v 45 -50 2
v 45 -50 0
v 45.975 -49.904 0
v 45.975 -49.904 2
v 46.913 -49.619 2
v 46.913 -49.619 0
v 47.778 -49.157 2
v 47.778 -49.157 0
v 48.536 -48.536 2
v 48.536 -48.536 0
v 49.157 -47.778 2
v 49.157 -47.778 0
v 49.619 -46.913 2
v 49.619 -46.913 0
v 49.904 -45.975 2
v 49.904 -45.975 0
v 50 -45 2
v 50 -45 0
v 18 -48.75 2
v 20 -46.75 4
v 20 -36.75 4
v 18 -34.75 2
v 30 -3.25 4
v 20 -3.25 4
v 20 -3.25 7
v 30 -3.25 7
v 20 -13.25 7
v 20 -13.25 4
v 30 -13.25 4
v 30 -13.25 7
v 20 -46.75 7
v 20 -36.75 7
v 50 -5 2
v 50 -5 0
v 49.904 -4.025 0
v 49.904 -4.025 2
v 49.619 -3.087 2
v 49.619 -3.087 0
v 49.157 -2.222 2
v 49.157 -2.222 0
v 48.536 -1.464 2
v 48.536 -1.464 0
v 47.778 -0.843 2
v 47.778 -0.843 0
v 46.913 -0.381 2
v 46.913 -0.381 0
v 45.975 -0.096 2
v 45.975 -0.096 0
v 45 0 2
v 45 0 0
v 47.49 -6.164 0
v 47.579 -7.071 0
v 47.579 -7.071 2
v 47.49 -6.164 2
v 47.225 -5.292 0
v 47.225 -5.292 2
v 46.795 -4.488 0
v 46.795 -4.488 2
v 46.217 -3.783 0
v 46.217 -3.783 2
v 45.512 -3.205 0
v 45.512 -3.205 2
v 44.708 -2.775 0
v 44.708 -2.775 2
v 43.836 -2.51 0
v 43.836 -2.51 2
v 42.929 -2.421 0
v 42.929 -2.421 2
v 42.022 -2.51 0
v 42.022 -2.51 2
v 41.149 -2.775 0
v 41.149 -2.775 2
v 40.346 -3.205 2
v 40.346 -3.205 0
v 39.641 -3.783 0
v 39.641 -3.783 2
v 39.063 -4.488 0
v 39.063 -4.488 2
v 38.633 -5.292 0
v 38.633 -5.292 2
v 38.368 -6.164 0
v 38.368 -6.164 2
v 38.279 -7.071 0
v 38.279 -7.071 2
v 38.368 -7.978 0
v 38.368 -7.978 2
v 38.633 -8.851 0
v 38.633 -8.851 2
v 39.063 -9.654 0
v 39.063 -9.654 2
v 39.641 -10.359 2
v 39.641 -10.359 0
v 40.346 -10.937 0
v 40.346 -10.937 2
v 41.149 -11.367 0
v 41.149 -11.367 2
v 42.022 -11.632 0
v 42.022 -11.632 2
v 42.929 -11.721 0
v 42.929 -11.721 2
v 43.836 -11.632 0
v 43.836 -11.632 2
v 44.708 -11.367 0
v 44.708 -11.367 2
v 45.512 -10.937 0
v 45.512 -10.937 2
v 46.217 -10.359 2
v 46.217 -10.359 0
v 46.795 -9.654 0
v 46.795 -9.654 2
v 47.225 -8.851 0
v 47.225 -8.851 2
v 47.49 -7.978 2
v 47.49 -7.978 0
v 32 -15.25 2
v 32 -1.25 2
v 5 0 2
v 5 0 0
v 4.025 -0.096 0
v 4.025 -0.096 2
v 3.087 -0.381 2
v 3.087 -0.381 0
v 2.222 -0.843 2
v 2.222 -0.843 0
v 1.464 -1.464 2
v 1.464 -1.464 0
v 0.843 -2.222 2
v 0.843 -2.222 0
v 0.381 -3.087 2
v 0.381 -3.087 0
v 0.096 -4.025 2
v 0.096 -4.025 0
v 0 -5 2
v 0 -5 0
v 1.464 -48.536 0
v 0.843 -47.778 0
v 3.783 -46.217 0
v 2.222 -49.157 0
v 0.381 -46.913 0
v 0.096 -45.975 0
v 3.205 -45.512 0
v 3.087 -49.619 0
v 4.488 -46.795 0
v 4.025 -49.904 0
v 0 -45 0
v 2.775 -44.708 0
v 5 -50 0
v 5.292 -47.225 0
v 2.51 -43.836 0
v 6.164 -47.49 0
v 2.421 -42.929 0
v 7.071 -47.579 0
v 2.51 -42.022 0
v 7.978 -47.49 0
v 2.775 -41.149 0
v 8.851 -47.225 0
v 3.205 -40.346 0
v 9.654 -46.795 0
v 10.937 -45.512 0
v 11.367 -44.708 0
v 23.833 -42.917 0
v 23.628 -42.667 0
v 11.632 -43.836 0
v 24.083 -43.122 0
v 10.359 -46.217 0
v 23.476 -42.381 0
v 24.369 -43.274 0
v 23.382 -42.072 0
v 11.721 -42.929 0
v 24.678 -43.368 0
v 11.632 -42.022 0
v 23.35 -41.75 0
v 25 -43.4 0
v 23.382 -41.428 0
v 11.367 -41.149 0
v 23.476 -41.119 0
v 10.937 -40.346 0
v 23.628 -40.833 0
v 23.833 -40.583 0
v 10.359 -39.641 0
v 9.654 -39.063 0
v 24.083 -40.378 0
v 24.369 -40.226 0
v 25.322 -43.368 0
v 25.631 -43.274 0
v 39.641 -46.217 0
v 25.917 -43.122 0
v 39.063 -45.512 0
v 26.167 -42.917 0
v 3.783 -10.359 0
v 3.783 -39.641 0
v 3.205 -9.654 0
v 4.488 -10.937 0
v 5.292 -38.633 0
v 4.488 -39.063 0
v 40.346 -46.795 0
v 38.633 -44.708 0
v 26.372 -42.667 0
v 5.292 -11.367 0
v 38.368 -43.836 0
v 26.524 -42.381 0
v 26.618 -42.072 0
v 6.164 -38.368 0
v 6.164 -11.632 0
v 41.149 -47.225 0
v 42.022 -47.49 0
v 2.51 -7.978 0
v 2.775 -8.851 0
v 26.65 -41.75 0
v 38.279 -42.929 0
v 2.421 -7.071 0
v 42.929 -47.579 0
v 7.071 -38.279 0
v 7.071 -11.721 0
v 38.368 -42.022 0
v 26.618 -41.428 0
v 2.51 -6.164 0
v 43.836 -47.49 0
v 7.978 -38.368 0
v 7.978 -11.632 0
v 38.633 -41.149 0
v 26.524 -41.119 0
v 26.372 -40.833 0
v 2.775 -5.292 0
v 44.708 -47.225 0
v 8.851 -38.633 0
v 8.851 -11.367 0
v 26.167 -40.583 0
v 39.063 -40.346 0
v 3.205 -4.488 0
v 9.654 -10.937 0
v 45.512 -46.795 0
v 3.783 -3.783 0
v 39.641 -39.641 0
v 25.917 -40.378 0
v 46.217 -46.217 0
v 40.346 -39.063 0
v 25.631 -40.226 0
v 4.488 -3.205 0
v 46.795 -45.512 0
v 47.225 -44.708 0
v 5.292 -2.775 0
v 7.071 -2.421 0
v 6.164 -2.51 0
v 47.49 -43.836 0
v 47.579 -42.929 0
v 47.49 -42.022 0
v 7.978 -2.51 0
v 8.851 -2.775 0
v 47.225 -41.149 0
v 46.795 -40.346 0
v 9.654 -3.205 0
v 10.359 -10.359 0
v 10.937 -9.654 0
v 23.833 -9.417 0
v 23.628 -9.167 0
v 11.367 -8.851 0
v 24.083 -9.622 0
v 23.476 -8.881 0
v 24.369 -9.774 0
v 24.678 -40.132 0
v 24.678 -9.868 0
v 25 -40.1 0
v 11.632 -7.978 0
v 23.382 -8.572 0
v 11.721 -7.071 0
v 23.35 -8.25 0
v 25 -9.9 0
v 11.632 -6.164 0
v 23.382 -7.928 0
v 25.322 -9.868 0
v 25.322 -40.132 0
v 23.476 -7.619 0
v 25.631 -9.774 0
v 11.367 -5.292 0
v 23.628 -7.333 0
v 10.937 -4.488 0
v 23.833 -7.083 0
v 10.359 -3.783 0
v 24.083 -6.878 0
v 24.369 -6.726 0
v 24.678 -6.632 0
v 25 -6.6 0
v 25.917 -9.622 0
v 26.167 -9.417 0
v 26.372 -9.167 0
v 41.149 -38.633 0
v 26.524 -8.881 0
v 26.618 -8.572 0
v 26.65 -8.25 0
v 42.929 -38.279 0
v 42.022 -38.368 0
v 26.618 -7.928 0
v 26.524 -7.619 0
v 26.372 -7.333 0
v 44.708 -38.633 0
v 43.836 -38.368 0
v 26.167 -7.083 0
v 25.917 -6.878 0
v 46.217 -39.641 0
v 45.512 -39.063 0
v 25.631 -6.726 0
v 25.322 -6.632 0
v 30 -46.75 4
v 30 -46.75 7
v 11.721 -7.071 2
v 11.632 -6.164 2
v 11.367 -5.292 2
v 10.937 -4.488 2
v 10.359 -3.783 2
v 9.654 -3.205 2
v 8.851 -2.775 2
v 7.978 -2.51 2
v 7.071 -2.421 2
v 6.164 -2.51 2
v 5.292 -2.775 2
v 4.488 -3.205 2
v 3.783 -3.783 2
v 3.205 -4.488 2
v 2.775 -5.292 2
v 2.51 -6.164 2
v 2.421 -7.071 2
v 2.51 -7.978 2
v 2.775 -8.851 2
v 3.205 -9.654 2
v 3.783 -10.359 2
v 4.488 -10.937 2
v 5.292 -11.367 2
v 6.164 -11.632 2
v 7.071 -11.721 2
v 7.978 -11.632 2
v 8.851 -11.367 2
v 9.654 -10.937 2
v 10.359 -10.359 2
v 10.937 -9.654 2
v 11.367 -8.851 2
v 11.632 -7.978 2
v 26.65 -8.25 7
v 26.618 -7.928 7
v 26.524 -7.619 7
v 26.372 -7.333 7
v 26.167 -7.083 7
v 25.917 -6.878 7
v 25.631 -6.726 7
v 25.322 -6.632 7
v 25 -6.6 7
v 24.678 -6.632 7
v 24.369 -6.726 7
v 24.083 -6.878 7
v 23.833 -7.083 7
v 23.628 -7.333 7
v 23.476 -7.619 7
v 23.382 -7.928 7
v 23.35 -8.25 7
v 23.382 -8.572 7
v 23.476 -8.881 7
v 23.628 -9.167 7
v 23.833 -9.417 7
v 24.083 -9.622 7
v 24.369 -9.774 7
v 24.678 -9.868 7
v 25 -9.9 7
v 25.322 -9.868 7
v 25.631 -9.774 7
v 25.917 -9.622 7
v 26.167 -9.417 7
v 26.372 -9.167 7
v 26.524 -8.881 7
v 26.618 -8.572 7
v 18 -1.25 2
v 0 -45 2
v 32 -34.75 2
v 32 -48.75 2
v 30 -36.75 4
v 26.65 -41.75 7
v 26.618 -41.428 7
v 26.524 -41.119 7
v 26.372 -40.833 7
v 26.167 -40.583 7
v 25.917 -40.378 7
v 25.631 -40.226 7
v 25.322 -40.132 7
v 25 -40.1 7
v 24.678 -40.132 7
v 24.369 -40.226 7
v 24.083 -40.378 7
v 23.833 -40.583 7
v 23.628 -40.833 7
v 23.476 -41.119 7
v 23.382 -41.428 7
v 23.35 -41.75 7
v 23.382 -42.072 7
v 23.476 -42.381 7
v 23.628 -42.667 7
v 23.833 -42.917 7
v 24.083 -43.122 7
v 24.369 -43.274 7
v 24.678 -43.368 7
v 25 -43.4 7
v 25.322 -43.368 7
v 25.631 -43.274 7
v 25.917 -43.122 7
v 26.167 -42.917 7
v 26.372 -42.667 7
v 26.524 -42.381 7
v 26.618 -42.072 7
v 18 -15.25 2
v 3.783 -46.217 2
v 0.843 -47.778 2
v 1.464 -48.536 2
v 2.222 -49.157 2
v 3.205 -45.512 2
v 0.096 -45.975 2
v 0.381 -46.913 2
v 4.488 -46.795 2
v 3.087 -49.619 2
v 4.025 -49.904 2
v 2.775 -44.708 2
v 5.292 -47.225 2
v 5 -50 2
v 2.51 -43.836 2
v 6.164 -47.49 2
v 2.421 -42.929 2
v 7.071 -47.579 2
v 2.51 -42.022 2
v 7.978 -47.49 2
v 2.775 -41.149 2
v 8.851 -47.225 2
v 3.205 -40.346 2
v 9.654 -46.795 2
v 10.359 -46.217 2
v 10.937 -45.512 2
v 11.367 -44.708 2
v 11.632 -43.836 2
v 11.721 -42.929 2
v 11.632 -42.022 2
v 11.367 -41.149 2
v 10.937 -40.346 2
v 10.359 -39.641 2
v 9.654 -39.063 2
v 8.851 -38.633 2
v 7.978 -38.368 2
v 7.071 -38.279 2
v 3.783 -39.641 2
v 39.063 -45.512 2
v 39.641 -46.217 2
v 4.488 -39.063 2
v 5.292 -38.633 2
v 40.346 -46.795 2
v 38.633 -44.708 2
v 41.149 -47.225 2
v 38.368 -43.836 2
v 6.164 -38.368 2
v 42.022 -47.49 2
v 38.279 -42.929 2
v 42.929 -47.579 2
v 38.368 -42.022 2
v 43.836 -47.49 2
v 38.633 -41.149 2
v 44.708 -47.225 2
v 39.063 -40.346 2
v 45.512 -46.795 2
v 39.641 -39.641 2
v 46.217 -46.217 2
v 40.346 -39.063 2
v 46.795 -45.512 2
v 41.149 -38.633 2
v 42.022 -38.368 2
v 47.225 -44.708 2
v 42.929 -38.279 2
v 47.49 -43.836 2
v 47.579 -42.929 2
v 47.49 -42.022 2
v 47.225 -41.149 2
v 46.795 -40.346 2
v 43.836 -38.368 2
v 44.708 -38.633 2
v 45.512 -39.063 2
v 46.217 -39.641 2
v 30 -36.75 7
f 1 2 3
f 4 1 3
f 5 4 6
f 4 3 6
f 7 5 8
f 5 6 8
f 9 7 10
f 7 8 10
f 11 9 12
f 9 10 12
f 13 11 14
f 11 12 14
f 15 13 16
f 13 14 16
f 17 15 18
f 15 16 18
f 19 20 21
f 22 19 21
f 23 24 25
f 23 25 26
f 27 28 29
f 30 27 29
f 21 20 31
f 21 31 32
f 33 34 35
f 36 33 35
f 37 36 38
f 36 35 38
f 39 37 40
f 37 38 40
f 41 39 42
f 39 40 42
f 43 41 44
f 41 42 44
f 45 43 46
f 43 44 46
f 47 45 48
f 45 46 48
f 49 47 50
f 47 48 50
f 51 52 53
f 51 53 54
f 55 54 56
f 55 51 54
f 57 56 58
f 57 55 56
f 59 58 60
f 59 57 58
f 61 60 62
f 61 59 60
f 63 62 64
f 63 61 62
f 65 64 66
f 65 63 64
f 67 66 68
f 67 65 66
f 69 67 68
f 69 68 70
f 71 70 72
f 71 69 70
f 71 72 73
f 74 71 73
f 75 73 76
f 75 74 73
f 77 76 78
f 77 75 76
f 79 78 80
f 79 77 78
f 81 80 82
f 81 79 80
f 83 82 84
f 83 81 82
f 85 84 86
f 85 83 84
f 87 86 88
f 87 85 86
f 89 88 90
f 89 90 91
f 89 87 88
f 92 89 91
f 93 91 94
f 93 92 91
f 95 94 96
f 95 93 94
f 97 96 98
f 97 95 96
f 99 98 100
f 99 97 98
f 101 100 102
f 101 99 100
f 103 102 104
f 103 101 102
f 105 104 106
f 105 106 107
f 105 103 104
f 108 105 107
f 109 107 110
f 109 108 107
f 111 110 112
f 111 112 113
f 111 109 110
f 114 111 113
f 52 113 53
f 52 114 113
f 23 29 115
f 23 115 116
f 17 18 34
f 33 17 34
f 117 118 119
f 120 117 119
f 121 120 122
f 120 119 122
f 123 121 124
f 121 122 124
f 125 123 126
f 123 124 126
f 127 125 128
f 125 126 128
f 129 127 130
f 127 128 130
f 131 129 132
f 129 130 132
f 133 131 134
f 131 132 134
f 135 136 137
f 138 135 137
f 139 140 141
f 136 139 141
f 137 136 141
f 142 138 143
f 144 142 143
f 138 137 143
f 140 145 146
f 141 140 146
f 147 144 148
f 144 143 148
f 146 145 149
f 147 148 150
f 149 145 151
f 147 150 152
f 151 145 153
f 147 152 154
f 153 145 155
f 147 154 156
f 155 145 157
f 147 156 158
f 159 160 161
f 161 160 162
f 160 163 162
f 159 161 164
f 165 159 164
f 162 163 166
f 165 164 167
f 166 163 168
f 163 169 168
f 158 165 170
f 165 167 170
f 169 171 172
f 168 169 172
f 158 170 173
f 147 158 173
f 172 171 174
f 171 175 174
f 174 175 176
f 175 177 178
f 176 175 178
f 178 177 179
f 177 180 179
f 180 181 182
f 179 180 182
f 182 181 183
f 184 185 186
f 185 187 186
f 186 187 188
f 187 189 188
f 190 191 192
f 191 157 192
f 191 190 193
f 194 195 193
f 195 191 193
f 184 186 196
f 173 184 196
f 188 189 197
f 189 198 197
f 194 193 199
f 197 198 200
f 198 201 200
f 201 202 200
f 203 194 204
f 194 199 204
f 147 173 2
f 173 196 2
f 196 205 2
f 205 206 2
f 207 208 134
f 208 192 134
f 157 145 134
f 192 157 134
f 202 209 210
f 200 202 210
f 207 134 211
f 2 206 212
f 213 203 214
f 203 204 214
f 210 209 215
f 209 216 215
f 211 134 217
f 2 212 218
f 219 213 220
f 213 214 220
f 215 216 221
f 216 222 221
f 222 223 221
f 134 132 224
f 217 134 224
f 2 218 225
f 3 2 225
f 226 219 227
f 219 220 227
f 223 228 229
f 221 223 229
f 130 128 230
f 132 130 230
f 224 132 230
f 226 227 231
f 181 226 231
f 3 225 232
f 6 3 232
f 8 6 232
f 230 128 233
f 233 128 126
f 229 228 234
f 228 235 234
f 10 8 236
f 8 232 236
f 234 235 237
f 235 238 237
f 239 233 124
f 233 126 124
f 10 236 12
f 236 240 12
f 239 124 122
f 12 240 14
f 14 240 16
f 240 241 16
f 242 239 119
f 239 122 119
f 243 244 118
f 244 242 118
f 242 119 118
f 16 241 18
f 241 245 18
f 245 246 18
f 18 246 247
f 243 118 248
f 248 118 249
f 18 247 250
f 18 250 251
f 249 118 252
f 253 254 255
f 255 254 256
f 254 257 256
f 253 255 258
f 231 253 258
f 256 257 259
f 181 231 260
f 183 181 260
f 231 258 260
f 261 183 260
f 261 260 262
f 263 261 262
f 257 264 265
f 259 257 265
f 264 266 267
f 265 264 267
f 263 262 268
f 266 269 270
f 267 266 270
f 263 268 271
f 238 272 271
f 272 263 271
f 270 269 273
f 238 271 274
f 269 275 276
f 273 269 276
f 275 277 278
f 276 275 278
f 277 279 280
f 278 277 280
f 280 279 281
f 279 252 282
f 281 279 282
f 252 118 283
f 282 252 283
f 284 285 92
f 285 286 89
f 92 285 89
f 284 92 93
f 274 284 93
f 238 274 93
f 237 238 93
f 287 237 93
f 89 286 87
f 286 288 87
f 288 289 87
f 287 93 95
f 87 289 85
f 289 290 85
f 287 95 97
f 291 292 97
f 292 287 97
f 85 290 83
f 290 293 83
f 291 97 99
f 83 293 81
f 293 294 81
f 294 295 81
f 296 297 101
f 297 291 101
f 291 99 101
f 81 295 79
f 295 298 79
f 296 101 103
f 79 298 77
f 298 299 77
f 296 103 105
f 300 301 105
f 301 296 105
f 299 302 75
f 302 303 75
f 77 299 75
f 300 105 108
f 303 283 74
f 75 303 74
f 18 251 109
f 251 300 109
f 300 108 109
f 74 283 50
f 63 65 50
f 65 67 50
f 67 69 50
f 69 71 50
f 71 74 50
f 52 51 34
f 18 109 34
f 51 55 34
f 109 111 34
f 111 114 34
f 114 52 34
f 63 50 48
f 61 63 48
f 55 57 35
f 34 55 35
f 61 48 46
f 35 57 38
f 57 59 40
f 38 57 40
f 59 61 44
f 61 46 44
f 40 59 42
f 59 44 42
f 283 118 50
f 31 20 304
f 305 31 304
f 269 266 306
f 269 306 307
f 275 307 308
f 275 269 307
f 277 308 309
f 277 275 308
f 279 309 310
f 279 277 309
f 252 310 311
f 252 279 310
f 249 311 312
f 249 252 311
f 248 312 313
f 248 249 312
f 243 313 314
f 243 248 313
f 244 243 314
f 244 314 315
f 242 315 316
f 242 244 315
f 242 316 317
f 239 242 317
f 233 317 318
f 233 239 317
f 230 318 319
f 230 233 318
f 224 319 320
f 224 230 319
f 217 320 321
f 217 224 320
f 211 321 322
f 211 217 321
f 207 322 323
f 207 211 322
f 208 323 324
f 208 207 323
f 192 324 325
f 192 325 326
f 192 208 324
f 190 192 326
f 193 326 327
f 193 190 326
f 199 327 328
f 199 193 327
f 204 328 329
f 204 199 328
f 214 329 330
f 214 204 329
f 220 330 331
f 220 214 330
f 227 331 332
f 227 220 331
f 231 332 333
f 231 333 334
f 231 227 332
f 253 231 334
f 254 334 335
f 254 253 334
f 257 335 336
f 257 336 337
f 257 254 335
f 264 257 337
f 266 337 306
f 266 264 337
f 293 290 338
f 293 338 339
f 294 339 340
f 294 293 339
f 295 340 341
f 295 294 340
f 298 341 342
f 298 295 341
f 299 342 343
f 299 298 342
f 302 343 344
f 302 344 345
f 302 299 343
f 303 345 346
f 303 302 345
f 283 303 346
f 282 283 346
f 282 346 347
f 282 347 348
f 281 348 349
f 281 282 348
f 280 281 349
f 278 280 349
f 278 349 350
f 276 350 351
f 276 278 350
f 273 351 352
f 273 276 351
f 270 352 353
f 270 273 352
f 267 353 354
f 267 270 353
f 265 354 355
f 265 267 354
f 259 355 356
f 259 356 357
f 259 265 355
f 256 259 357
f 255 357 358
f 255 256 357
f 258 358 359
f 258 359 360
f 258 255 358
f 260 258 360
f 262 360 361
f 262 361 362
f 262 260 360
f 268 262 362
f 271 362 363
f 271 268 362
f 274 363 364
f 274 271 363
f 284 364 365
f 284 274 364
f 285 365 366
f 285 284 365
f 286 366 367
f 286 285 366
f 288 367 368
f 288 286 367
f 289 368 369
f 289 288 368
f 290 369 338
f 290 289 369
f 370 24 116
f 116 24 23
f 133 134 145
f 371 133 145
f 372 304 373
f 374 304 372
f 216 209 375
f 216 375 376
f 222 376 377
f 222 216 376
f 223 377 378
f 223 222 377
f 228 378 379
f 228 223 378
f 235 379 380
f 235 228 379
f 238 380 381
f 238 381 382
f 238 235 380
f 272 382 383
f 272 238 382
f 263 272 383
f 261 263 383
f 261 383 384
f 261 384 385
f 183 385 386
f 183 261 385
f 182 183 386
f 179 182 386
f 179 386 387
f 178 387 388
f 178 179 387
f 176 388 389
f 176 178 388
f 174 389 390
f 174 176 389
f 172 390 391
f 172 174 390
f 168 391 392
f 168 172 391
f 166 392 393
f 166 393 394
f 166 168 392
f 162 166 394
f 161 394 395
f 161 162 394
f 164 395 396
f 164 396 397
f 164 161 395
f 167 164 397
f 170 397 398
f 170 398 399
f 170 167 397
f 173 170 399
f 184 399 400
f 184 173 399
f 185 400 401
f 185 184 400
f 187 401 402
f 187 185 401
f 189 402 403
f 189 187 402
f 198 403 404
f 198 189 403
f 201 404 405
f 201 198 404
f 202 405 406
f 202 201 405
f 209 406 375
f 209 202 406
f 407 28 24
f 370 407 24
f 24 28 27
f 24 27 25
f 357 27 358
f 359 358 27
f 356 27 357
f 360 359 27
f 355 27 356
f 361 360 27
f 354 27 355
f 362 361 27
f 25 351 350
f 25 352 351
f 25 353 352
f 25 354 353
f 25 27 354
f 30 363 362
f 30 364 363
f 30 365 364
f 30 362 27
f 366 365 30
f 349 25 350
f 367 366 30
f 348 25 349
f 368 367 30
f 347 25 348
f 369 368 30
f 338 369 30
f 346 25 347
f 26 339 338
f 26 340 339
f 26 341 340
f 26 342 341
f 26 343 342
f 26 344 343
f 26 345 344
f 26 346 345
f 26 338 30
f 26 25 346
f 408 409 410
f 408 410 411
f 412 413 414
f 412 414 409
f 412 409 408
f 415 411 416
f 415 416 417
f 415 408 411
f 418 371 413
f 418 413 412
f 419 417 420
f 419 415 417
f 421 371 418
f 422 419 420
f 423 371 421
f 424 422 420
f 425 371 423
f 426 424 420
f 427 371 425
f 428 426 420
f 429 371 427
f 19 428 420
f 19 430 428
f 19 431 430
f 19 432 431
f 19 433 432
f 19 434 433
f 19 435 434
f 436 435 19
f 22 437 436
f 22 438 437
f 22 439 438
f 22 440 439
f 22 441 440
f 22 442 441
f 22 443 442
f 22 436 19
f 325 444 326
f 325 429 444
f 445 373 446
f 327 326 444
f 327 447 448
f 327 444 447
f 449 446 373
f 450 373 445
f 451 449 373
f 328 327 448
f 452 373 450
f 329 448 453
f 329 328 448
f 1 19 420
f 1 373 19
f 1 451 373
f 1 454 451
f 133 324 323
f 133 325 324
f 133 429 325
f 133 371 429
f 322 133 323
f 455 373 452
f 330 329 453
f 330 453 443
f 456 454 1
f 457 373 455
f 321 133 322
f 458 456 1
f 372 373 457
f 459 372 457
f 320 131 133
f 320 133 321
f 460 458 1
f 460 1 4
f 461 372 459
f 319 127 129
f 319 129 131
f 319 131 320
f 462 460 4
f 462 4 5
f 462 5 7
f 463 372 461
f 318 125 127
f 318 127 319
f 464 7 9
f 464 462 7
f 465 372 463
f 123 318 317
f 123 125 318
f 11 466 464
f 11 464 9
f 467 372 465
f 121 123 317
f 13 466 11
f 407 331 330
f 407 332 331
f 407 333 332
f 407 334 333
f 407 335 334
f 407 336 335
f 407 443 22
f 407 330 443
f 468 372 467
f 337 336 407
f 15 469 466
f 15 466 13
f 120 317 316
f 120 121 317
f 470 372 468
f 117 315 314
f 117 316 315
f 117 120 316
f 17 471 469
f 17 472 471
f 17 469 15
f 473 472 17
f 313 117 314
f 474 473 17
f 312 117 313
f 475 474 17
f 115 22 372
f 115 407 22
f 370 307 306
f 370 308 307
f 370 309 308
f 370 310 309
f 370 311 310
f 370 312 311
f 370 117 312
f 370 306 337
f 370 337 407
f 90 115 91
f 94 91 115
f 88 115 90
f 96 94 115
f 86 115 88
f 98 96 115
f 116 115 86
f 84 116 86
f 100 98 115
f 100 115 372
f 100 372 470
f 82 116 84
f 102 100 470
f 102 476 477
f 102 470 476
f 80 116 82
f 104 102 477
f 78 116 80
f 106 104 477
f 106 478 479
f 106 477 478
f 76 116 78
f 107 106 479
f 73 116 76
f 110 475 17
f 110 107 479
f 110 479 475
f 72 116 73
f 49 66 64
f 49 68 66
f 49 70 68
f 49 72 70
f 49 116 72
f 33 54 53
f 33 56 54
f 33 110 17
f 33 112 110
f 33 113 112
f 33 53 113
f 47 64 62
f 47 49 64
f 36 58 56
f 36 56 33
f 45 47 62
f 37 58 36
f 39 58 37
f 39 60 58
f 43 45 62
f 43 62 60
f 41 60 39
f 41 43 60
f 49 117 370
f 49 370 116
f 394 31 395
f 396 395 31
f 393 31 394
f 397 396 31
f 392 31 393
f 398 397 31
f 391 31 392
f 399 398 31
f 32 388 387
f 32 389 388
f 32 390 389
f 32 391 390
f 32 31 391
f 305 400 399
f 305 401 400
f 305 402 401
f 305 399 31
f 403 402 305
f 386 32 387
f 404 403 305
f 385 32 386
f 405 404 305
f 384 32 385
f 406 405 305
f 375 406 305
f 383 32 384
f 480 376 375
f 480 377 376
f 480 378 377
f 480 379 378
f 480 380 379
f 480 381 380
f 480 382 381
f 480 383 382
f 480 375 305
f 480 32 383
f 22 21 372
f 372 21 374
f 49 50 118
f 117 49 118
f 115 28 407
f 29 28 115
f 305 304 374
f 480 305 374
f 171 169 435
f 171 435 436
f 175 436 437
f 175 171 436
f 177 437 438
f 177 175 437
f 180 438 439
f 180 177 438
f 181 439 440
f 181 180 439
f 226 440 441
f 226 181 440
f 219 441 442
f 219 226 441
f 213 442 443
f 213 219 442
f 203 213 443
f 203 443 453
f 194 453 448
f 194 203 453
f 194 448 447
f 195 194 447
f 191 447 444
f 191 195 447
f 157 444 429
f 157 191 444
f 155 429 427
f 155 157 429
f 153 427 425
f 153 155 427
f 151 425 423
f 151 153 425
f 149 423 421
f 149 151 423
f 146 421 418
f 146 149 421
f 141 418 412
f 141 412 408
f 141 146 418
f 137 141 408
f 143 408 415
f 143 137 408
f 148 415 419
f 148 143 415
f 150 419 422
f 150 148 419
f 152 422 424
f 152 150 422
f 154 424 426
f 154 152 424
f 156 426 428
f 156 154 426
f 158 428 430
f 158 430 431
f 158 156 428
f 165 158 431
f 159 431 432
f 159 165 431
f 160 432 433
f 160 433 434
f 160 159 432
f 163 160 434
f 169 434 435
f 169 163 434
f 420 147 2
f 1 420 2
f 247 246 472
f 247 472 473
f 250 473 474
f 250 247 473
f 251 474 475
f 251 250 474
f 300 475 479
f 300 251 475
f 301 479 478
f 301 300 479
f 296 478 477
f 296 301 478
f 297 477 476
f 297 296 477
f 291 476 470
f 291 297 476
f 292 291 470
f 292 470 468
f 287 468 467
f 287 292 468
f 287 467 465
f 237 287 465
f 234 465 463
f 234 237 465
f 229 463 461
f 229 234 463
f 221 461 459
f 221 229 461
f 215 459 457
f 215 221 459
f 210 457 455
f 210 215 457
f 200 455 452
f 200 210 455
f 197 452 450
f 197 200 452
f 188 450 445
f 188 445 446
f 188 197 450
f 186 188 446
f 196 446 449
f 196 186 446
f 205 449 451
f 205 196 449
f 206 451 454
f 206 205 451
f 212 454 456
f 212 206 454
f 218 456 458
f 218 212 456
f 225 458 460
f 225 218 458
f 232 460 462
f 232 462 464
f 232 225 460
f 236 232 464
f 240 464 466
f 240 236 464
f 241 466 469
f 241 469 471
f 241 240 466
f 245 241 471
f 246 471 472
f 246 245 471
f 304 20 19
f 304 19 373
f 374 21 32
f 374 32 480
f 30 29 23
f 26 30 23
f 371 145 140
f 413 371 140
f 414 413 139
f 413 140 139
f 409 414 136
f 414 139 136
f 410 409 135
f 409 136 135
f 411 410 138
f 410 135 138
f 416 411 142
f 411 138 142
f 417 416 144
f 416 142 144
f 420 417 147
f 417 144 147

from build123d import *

# Parameters (mm, degrees)
F0_W     = 10
F0_H     = 10
F0_R     = 1.65
F1_DEPTH = 7
F0_R_2   = 4.65
F2_DEPTH = 2
F3_SIZE  = 2


with BuildPart() as f1:
    # F0 (on Top) → F1 (new body)
    with BuildSketch(Plane.XY):
        with Locations((25, -41.75)):
            Rectangle(F0_W, F0_H)
        with Locations((25, -41.75)):
            Circle(F0_R, mode=Mode.SUBTRACT)
    extrude(amount=F1_DEPTH)



with BuildPart() as f1b:
    # F0 (on Top) → F1, piece 2 (new body)
    with BuildSketch(Plane.XY):
        with Locations((25, -8.25)):
            Rectangle(F0_W, F0_H)
        with Locations((25, -8.25)):
            Circle(F0_R, mode=Mode.SUBTRACT)
    extrude(amount=F1_DEPTH)


with BuildPart() as f1_1:
    add(f1.part)

    add(f1b.part)  # F2 merges F1b
    # F0 (on Top) → F2 (join)
    with BuildSketch(Plane.XY):
        with BuildLine():
            Line((45, 0), (5, 0))
            ThreePointArc((5, 0), (1.4644660941, -1.4644660941), (0, -5))
            Line((0, -5), (0, -45))
            ThreePointArc((0, -45), (1.4644660941, -48.5355339059), (5, -50))
            Line((5, -50), (45, -50))
            ThreePointArc((45, -50), (48.5355339059, -48.5355339059), (50, -45))
            Line((50, -45), (50, -5))
            ThreePointArc((50, -5), (48.5355339059, -1.4644660941), (45, 0))
        make_face()
        with Locations((7.0710678119, -42.9289321881)):
            Circle(F0_R_2, mode=Mode.SUBTRACT)
        with Locations((25, -41.75)):
            Rectangle(F0_W, F0_H, mode=Mode.SUBTRACT)
        with Locations((42.9289321881, -42.9289321881)):
            Circle(F0_R_2, mode=Mode.SUBTRACT)
        with Locations((7.0710678119, -7.0710678119)):
            Circle(F0_R_2, mode=Mode.SUBTRACT)
        with Locations((25, -8.25)):
            Rectangle(F0_W, F0_H, mode=Mode.SUBTRACT)
        with Locations((42.9289321881, -7.0710678119)):
            Circle(F0_R_2, mode=Mode.SUBTRACT)
    extrude(amount=F2_DEPTH)

    # F3
    f3_edges = [f1_1.edges().sort_by_distance(p)[0] for p in [
        (25, -46.75, 2),
        (30, -8.25, 2),
        (30, -41.75, 2),
        (25, -13.25, 2),
        (25, -3.25, 2),
        (25, -36.75, 2),
        (20, -8.25, 2),
        (20, -41.75, 2),
    ]]
    chamfer(f3_edges, length=F3_SIZE)


solid = f1_1.part
